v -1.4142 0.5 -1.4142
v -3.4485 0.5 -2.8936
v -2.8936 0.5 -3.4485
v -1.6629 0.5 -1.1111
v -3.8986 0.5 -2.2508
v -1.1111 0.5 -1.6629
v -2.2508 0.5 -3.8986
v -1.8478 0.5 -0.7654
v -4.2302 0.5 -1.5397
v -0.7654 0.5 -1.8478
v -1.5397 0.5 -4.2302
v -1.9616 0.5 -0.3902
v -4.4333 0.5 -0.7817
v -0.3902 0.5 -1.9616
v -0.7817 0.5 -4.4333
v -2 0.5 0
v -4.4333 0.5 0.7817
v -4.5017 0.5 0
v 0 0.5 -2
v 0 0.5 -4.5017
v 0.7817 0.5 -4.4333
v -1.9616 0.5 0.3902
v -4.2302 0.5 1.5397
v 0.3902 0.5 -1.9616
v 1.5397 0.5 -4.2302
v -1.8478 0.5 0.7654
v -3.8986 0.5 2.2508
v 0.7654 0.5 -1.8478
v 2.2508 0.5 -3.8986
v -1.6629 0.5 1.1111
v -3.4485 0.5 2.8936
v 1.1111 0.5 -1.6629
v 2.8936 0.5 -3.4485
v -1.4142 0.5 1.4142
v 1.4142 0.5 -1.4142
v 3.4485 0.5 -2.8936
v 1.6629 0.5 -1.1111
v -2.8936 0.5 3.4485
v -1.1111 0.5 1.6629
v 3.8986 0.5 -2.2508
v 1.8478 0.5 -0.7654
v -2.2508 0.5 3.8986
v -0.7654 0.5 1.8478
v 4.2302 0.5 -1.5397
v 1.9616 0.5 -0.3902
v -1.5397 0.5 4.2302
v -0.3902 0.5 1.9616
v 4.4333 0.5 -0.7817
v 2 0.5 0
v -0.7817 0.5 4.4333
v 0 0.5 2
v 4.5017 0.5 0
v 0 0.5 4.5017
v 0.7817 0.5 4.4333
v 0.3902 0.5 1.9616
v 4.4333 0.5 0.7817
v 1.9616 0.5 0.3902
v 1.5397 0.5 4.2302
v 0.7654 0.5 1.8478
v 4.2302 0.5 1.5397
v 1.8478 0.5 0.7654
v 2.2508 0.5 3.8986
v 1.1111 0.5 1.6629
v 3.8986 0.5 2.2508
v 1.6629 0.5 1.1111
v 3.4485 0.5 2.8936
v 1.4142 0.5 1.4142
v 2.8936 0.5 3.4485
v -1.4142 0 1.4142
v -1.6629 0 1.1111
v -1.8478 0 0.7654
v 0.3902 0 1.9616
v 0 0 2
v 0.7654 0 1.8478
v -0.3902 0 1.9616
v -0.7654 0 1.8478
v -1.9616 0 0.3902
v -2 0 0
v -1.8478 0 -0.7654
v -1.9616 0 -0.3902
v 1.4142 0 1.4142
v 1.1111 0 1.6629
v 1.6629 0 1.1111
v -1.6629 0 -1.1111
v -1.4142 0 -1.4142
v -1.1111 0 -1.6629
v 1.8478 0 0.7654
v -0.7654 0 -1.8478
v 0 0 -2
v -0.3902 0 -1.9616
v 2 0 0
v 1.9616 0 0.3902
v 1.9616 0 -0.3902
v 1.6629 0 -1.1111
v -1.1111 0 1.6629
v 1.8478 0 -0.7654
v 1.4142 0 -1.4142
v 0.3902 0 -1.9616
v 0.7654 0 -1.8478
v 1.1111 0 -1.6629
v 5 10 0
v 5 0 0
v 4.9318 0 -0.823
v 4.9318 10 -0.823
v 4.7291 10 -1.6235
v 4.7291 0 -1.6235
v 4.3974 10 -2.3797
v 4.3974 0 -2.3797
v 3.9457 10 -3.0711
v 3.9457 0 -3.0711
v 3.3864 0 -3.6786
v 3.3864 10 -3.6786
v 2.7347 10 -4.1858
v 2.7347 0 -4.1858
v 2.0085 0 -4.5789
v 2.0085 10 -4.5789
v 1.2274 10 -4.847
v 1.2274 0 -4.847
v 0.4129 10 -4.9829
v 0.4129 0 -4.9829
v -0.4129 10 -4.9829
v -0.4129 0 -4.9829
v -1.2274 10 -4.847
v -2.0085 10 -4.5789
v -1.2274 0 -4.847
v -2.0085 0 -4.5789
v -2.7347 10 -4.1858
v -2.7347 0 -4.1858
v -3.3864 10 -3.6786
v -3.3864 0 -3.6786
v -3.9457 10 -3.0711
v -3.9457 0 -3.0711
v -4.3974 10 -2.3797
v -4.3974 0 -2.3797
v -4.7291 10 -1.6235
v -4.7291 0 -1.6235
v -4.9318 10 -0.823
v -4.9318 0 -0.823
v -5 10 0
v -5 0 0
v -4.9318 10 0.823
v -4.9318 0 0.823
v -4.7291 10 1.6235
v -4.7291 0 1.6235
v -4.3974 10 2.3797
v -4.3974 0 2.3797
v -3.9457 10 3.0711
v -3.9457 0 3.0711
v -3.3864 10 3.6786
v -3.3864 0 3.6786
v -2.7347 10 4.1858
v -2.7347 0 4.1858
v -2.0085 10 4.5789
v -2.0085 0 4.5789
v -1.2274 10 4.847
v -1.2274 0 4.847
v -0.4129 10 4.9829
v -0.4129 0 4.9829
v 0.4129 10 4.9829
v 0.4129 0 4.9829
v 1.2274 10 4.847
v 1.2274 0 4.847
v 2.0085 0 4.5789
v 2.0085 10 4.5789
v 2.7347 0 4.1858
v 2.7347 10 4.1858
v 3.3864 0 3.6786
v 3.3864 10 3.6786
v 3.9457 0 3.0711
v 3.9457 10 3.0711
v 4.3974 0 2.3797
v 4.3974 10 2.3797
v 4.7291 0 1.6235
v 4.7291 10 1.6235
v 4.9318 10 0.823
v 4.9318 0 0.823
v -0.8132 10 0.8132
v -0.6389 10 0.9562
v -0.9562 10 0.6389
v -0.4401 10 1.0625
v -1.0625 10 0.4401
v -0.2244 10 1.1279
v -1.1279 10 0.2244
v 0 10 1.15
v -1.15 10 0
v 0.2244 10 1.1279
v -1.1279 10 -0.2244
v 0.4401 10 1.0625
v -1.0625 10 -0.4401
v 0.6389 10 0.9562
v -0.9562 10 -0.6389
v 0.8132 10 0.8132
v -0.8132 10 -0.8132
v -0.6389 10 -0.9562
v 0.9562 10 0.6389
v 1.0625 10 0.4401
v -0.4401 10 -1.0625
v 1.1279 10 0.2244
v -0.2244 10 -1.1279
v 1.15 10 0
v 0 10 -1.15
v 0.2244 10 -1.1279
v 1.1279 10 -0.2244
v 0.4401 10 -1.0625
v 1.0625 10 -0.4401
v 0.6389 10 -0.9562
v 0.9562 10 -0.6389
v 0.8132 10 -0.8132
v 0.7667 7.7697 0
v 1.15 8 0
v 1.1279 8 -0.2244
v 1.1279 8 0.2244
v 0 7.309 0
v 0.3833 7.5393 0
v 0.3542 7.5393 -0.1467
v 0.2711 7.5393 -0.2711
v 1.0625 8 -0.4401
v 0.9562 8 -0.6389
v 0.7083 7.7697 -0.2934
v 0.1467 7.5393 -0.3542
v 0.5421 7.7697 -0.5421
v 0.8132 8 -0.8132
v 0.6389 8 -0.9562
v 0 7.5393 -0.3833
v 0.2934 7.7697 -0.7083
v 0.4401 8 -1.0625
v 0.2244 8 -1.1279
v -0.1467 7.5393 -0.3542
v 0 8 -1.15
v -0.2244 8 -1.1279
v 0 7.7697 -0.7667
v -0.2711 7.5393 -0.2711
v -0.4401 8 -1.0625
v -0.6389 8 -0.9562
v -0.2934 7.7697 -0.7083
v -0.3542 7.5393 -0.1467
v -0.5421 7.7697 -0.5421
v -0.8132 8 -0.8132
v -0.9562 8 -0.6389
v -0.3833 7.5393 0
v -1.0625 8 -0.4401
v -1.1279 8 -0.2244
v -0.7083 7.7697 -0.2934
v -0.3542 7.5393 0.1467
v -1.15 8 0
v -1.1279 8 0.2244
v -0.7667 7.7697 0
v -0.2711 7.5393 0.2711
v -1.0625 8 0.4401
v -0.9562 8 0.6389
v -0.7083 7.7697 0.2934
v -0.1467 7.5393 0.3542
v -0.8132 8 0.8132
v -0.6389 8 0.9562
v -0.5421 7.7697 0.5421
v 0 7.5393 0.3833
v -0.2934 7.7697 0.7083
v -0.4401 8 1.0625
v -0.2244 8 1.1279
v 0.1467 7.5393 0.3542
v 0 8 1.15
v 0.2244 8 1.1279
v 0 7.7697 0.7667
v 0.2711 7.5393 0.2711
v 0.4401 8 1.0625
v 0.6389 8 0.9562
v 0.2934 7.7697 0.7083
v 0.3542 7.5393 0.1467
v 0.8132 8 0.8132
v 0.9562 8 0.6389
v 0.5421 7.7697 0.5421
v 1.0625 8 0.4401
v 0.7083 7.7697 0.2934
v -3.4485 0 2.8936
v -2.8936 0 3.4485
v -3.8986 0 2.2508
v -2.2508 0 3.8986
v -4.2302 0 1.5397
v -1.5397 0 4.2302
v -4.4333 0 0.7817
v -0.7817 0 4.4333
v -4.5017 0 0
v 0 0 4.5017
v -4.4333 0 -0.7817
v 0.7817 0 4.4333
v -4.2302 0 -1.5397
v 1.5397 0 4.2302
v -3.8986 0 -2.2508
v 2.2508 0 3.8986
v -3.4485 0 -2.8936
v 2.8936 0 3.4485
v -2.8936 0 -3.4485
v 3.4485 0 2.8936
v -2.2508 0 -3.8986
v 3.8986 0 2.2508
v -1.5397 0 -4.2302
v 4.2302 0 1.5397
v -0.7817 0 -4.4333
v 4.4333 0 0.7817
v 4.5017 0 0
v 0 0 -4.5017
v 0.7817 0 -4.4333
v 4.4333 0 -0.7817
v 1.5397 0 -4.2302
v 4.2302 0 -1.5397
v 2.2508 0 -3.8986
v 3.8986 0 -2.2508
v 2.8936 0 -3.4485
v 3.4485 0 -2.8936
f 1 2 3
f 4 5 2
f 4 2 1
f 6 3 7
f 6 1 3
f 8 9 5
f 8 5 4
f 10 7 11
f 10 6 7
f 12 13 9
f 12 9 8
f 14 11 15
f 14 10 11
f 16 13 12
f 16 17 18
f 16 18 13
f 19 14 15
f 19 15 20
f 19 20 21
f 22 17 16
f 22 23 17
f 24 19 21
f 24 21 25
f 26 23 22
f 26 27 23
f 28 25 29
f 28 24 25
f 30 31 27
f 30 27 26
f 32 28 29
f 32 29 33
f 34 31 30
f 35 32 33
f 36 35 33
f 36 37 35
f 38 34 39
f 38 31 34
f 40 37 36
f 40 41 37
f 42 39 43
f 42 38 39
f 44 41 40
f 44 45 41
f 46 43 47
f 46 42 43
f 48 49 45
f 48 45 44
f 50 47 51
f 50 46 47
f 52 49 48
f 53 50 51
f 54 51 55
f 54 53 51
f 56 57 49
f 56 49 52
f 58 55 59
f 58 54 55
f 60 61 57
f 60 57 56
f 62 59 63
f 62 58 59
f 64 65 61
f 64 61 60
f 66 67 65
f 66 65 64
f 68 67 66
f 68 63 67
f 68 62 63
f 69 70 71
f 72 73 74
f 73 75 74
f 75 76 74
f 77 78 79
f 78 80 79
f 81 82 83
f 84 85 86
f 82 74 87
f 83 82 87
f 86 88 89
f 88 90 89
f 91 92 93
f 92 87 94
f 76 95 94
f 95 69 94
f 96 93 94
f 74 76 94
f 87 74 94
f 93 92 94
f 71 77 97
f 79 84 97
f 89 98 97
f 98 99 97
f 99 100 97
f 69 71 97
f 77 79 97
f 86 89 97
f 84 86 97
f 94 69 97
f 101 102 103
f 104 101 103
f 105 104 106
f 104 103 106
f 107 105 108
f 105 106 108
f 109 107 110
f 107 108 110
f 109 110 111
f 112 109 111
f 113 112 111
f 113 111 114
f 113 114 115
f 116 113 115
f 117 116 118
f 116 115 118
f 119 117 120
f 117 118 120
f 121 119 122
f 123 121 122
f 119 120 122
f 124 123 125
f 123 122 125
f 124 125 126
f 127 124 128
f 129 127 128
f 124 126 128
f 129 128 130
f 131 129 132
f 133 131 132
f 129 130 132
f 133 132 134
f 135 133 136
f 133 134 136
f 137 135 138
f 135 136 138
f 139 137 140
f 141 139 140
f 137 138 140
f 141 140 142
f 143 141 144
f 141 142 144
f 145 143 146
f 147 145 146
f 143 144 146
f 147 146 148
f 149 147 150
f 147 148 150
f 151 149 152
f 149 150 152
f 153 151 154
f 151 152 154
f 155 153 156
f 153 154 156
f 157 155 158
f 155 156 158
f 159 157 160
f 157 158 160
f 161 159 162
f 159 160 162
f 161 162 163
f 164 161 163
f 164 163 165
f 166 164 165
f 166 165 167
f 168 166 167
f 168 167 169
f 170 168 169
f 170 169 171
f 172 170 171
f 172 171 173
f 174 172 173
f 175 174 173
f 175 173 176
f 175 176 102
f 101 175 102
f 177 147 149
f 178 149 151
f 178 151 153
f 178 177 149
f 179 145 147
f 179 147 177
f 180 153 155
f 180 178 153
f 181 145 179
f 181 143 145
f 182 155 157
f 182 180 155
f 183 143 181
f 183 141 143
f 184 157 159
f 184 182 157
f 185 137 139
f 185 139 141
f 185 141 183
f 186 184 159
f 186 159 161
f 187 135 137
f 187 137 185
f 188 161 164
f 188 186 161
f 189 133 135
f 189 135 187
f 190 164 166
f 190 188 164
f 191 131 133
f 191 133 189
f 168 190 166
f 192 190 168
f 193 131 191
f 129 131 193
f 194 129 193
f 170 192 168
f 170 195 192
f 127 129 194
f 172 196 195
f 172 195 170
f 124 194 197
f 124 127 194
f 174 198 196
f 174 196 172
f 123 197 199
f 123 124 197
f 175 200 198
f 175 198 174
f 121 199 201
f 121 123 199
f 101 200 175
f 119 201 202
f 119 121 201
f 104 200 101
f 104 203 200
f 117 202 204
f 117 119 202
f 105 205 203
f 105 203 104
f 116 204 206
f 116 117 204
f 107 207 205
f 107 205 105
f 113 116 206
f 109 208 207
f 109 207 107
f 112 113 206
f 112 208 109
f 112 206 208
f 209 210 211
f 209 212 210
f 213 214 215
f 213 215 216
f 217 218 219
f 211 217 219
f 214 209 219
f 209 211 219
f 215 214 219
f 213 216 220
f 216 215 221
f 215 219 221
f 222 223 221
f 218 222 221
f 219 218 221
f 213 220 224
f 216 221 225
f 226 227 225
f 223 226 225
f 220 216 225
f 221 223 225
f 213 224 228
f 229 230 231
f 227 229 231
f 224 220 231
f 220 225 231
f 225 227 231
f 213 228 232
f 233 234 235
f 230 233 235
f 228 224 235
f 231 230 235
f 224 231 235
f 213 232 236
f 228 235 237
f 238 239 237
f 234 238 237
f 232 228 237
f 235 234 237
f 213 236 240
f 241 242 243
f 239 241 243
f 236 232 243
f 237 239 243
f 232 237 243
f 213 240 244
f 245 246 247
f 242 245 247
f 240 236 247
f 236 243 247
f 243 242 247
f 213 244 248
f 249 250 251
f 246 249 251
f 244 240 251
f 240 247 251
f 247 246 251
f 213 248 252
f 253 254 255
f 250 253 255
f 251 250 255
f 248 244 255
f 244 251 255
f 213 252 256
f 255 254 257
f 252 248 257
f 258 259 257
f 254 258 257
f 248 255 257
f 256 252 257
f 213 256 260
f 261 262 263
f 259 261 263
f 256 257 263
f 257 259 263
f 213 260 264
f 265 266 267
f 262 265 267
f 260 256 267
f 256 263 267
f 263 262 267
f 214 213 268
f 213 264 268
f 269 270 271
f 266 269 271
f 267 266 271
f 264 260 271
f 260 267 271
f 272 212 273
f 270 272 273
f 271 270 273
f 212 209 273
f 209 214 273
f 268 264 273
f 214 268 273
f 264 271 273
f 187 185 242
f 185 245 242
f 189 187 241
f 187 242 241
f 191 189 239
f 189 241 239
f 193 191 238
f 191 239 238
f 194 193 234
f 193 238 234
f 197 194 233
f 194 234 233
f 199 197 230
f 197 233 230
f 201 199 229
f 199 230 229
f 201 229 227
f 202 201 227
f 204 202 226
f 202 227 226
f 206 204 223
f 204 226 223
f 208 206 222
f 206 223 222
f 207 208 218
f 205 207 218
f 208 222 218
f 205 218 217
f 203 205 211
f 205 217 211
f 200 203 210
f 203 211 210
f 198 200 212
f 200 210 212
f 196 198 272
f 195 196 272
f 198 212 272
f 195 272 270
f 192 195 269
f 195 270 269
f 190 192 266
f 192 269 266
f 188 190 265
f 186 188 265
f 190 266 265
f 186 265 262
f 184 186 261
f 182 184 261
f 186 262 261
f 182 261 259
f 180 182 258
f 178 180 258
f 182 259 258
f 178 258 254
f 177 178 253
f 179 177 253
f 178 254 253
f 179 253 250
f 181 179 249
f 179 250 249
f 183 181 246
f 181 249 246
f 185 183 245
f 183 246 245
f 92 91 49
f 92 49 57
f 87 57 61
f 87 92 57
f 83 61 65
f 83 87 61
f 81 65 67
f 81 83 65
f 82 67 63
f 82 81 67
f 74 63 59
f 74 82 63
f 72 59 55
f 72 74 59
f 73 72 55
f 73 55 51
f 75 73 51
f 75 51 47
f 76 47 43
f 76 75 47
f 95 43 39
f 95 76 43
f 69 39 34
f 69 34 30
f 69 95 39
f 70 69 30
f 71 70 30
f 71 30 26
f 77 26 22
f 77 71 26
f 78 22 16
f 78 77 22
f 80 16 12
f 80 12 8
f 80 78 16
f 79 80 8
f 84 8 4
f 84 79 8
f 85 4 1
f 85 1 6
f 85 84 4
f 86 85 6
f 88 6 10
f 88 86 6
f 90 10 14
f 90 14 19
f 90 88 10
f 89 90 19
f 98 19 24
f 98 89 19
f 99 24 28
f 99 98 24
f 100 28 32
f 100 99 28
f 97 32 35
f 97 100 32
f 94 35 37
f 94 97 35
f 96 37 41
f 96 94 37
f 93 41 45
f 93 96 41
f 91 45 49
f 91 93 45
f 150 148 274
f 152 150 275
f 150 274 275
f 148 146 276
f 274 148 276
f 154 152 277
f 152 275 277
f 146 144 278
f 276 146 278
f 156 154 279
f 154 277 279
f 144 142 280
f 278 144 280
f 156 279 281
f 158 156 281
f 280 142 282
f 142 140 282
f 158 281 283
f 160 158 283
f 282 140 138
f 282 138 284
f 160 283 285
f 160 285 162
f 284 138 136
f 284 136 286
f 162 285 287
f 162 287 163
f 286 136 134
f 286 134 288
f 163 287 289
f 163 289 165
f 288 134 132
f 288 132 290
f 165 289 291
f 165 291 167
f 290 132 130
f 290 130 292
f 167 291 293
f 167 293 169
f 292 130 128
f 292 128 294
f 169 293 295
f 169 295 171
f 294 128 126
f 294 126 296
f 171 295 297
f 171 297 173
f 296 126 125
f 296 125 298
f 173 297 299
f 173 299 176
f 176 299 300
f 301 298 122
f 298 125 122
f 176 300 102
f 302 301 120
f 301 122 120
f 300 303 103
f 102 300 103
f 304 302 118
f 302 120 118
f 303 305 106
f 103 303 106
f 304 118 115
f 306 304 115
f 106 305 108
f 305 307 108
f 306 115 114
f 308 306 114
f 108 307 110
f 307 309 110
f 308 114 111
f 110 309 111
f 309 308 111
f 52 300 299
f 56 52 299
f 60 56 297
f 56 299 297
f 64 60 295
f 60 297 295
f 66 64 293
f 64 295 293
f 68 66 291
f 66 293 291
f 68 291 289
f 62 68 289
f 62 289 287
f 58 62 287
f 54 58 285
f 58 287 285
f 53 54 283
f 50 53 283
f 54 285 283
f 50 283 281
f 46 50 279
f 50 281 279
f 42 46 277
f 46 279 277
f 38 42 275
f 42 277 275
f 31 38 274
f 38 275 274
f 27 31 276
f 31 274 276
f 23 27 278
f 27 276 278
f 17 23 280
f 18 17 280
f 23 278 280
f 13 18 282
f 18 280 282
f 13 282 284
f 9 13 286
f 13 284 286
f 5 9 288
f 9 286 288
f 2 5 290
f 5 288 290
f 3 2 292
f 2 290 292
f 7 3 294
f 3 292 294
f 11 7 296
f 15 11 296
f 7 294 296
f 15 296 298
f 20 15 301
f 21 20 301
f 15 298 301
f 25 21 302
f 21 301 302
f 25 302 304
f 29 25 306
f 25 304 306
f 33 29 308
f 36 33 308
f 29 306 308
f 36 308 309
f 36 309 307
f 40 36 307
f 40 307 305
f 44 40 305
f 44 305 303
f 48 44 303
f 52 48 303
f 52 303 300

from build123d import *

# Parameters (mm, degrees)
SKETCH_1_R              = 5
EXTRUDE_1_DEPTH         = 10
SKETCH_2_R              = 4.501699131
SKETCH_2_R_2            = 2
CUT_EXTRUDE_1_DEPTH     = 0.5
HOLE_WIZARD_M2_21_D     = 2.3
HOLE_WIZARD_M2_21_DEPTH = 2
HOLE_WIZARD_M2_21_TIP   = 0.690989712


with BuildPart() as part:
    # Эскиз1 → Бобышка-Вытянуть1 (new body)
    with BuildSketch(Plane(origin=(0, 0, 0), x_dir=(1, 0, 0), z_dir=(0, 1, 0))):
        Circle(SKETCH_1_R)
    extrude(amount=EXTRUDE_1_DEPTH)

    # Эскиз2 → Вырез-Вытянуть1 (cut)
    with BuildSketch(Plane.XZ):
        Circle(SKETCH_2_R)
        Circle(SKETCH_2_R_2, mode=Mode.SUBTRACT)
    extrude(amount=-CUT_EXTRUDE_1_DEPTH, mode=Mode.SUBTRACT)

    # Сверло под метчик  спиральное M2.21
    with Locations(Plane(origin=(0, 10, 0), x_dir=(1, 0, 0), z_dir=(0, 1, 0))):
        with Locations((0, 0)):
            Hole(HOLE_WIZARD_M2_21_D / 2, depth=HOLE_WIZARD_M2_21_DEPTH)
            with Locations((0, 0, -(HOLE_WIZARD_M2_21_DEPTH + HOLE_WIZARD_M2_21_TIP / 2))):  # 118° drill point
                Cone(0, HOLE_WIZARD_M2_21_D / 2, HOLE_WIZARD_M2_21_TIP, mode=Mode.SUBTRACT)


solid = part.part
